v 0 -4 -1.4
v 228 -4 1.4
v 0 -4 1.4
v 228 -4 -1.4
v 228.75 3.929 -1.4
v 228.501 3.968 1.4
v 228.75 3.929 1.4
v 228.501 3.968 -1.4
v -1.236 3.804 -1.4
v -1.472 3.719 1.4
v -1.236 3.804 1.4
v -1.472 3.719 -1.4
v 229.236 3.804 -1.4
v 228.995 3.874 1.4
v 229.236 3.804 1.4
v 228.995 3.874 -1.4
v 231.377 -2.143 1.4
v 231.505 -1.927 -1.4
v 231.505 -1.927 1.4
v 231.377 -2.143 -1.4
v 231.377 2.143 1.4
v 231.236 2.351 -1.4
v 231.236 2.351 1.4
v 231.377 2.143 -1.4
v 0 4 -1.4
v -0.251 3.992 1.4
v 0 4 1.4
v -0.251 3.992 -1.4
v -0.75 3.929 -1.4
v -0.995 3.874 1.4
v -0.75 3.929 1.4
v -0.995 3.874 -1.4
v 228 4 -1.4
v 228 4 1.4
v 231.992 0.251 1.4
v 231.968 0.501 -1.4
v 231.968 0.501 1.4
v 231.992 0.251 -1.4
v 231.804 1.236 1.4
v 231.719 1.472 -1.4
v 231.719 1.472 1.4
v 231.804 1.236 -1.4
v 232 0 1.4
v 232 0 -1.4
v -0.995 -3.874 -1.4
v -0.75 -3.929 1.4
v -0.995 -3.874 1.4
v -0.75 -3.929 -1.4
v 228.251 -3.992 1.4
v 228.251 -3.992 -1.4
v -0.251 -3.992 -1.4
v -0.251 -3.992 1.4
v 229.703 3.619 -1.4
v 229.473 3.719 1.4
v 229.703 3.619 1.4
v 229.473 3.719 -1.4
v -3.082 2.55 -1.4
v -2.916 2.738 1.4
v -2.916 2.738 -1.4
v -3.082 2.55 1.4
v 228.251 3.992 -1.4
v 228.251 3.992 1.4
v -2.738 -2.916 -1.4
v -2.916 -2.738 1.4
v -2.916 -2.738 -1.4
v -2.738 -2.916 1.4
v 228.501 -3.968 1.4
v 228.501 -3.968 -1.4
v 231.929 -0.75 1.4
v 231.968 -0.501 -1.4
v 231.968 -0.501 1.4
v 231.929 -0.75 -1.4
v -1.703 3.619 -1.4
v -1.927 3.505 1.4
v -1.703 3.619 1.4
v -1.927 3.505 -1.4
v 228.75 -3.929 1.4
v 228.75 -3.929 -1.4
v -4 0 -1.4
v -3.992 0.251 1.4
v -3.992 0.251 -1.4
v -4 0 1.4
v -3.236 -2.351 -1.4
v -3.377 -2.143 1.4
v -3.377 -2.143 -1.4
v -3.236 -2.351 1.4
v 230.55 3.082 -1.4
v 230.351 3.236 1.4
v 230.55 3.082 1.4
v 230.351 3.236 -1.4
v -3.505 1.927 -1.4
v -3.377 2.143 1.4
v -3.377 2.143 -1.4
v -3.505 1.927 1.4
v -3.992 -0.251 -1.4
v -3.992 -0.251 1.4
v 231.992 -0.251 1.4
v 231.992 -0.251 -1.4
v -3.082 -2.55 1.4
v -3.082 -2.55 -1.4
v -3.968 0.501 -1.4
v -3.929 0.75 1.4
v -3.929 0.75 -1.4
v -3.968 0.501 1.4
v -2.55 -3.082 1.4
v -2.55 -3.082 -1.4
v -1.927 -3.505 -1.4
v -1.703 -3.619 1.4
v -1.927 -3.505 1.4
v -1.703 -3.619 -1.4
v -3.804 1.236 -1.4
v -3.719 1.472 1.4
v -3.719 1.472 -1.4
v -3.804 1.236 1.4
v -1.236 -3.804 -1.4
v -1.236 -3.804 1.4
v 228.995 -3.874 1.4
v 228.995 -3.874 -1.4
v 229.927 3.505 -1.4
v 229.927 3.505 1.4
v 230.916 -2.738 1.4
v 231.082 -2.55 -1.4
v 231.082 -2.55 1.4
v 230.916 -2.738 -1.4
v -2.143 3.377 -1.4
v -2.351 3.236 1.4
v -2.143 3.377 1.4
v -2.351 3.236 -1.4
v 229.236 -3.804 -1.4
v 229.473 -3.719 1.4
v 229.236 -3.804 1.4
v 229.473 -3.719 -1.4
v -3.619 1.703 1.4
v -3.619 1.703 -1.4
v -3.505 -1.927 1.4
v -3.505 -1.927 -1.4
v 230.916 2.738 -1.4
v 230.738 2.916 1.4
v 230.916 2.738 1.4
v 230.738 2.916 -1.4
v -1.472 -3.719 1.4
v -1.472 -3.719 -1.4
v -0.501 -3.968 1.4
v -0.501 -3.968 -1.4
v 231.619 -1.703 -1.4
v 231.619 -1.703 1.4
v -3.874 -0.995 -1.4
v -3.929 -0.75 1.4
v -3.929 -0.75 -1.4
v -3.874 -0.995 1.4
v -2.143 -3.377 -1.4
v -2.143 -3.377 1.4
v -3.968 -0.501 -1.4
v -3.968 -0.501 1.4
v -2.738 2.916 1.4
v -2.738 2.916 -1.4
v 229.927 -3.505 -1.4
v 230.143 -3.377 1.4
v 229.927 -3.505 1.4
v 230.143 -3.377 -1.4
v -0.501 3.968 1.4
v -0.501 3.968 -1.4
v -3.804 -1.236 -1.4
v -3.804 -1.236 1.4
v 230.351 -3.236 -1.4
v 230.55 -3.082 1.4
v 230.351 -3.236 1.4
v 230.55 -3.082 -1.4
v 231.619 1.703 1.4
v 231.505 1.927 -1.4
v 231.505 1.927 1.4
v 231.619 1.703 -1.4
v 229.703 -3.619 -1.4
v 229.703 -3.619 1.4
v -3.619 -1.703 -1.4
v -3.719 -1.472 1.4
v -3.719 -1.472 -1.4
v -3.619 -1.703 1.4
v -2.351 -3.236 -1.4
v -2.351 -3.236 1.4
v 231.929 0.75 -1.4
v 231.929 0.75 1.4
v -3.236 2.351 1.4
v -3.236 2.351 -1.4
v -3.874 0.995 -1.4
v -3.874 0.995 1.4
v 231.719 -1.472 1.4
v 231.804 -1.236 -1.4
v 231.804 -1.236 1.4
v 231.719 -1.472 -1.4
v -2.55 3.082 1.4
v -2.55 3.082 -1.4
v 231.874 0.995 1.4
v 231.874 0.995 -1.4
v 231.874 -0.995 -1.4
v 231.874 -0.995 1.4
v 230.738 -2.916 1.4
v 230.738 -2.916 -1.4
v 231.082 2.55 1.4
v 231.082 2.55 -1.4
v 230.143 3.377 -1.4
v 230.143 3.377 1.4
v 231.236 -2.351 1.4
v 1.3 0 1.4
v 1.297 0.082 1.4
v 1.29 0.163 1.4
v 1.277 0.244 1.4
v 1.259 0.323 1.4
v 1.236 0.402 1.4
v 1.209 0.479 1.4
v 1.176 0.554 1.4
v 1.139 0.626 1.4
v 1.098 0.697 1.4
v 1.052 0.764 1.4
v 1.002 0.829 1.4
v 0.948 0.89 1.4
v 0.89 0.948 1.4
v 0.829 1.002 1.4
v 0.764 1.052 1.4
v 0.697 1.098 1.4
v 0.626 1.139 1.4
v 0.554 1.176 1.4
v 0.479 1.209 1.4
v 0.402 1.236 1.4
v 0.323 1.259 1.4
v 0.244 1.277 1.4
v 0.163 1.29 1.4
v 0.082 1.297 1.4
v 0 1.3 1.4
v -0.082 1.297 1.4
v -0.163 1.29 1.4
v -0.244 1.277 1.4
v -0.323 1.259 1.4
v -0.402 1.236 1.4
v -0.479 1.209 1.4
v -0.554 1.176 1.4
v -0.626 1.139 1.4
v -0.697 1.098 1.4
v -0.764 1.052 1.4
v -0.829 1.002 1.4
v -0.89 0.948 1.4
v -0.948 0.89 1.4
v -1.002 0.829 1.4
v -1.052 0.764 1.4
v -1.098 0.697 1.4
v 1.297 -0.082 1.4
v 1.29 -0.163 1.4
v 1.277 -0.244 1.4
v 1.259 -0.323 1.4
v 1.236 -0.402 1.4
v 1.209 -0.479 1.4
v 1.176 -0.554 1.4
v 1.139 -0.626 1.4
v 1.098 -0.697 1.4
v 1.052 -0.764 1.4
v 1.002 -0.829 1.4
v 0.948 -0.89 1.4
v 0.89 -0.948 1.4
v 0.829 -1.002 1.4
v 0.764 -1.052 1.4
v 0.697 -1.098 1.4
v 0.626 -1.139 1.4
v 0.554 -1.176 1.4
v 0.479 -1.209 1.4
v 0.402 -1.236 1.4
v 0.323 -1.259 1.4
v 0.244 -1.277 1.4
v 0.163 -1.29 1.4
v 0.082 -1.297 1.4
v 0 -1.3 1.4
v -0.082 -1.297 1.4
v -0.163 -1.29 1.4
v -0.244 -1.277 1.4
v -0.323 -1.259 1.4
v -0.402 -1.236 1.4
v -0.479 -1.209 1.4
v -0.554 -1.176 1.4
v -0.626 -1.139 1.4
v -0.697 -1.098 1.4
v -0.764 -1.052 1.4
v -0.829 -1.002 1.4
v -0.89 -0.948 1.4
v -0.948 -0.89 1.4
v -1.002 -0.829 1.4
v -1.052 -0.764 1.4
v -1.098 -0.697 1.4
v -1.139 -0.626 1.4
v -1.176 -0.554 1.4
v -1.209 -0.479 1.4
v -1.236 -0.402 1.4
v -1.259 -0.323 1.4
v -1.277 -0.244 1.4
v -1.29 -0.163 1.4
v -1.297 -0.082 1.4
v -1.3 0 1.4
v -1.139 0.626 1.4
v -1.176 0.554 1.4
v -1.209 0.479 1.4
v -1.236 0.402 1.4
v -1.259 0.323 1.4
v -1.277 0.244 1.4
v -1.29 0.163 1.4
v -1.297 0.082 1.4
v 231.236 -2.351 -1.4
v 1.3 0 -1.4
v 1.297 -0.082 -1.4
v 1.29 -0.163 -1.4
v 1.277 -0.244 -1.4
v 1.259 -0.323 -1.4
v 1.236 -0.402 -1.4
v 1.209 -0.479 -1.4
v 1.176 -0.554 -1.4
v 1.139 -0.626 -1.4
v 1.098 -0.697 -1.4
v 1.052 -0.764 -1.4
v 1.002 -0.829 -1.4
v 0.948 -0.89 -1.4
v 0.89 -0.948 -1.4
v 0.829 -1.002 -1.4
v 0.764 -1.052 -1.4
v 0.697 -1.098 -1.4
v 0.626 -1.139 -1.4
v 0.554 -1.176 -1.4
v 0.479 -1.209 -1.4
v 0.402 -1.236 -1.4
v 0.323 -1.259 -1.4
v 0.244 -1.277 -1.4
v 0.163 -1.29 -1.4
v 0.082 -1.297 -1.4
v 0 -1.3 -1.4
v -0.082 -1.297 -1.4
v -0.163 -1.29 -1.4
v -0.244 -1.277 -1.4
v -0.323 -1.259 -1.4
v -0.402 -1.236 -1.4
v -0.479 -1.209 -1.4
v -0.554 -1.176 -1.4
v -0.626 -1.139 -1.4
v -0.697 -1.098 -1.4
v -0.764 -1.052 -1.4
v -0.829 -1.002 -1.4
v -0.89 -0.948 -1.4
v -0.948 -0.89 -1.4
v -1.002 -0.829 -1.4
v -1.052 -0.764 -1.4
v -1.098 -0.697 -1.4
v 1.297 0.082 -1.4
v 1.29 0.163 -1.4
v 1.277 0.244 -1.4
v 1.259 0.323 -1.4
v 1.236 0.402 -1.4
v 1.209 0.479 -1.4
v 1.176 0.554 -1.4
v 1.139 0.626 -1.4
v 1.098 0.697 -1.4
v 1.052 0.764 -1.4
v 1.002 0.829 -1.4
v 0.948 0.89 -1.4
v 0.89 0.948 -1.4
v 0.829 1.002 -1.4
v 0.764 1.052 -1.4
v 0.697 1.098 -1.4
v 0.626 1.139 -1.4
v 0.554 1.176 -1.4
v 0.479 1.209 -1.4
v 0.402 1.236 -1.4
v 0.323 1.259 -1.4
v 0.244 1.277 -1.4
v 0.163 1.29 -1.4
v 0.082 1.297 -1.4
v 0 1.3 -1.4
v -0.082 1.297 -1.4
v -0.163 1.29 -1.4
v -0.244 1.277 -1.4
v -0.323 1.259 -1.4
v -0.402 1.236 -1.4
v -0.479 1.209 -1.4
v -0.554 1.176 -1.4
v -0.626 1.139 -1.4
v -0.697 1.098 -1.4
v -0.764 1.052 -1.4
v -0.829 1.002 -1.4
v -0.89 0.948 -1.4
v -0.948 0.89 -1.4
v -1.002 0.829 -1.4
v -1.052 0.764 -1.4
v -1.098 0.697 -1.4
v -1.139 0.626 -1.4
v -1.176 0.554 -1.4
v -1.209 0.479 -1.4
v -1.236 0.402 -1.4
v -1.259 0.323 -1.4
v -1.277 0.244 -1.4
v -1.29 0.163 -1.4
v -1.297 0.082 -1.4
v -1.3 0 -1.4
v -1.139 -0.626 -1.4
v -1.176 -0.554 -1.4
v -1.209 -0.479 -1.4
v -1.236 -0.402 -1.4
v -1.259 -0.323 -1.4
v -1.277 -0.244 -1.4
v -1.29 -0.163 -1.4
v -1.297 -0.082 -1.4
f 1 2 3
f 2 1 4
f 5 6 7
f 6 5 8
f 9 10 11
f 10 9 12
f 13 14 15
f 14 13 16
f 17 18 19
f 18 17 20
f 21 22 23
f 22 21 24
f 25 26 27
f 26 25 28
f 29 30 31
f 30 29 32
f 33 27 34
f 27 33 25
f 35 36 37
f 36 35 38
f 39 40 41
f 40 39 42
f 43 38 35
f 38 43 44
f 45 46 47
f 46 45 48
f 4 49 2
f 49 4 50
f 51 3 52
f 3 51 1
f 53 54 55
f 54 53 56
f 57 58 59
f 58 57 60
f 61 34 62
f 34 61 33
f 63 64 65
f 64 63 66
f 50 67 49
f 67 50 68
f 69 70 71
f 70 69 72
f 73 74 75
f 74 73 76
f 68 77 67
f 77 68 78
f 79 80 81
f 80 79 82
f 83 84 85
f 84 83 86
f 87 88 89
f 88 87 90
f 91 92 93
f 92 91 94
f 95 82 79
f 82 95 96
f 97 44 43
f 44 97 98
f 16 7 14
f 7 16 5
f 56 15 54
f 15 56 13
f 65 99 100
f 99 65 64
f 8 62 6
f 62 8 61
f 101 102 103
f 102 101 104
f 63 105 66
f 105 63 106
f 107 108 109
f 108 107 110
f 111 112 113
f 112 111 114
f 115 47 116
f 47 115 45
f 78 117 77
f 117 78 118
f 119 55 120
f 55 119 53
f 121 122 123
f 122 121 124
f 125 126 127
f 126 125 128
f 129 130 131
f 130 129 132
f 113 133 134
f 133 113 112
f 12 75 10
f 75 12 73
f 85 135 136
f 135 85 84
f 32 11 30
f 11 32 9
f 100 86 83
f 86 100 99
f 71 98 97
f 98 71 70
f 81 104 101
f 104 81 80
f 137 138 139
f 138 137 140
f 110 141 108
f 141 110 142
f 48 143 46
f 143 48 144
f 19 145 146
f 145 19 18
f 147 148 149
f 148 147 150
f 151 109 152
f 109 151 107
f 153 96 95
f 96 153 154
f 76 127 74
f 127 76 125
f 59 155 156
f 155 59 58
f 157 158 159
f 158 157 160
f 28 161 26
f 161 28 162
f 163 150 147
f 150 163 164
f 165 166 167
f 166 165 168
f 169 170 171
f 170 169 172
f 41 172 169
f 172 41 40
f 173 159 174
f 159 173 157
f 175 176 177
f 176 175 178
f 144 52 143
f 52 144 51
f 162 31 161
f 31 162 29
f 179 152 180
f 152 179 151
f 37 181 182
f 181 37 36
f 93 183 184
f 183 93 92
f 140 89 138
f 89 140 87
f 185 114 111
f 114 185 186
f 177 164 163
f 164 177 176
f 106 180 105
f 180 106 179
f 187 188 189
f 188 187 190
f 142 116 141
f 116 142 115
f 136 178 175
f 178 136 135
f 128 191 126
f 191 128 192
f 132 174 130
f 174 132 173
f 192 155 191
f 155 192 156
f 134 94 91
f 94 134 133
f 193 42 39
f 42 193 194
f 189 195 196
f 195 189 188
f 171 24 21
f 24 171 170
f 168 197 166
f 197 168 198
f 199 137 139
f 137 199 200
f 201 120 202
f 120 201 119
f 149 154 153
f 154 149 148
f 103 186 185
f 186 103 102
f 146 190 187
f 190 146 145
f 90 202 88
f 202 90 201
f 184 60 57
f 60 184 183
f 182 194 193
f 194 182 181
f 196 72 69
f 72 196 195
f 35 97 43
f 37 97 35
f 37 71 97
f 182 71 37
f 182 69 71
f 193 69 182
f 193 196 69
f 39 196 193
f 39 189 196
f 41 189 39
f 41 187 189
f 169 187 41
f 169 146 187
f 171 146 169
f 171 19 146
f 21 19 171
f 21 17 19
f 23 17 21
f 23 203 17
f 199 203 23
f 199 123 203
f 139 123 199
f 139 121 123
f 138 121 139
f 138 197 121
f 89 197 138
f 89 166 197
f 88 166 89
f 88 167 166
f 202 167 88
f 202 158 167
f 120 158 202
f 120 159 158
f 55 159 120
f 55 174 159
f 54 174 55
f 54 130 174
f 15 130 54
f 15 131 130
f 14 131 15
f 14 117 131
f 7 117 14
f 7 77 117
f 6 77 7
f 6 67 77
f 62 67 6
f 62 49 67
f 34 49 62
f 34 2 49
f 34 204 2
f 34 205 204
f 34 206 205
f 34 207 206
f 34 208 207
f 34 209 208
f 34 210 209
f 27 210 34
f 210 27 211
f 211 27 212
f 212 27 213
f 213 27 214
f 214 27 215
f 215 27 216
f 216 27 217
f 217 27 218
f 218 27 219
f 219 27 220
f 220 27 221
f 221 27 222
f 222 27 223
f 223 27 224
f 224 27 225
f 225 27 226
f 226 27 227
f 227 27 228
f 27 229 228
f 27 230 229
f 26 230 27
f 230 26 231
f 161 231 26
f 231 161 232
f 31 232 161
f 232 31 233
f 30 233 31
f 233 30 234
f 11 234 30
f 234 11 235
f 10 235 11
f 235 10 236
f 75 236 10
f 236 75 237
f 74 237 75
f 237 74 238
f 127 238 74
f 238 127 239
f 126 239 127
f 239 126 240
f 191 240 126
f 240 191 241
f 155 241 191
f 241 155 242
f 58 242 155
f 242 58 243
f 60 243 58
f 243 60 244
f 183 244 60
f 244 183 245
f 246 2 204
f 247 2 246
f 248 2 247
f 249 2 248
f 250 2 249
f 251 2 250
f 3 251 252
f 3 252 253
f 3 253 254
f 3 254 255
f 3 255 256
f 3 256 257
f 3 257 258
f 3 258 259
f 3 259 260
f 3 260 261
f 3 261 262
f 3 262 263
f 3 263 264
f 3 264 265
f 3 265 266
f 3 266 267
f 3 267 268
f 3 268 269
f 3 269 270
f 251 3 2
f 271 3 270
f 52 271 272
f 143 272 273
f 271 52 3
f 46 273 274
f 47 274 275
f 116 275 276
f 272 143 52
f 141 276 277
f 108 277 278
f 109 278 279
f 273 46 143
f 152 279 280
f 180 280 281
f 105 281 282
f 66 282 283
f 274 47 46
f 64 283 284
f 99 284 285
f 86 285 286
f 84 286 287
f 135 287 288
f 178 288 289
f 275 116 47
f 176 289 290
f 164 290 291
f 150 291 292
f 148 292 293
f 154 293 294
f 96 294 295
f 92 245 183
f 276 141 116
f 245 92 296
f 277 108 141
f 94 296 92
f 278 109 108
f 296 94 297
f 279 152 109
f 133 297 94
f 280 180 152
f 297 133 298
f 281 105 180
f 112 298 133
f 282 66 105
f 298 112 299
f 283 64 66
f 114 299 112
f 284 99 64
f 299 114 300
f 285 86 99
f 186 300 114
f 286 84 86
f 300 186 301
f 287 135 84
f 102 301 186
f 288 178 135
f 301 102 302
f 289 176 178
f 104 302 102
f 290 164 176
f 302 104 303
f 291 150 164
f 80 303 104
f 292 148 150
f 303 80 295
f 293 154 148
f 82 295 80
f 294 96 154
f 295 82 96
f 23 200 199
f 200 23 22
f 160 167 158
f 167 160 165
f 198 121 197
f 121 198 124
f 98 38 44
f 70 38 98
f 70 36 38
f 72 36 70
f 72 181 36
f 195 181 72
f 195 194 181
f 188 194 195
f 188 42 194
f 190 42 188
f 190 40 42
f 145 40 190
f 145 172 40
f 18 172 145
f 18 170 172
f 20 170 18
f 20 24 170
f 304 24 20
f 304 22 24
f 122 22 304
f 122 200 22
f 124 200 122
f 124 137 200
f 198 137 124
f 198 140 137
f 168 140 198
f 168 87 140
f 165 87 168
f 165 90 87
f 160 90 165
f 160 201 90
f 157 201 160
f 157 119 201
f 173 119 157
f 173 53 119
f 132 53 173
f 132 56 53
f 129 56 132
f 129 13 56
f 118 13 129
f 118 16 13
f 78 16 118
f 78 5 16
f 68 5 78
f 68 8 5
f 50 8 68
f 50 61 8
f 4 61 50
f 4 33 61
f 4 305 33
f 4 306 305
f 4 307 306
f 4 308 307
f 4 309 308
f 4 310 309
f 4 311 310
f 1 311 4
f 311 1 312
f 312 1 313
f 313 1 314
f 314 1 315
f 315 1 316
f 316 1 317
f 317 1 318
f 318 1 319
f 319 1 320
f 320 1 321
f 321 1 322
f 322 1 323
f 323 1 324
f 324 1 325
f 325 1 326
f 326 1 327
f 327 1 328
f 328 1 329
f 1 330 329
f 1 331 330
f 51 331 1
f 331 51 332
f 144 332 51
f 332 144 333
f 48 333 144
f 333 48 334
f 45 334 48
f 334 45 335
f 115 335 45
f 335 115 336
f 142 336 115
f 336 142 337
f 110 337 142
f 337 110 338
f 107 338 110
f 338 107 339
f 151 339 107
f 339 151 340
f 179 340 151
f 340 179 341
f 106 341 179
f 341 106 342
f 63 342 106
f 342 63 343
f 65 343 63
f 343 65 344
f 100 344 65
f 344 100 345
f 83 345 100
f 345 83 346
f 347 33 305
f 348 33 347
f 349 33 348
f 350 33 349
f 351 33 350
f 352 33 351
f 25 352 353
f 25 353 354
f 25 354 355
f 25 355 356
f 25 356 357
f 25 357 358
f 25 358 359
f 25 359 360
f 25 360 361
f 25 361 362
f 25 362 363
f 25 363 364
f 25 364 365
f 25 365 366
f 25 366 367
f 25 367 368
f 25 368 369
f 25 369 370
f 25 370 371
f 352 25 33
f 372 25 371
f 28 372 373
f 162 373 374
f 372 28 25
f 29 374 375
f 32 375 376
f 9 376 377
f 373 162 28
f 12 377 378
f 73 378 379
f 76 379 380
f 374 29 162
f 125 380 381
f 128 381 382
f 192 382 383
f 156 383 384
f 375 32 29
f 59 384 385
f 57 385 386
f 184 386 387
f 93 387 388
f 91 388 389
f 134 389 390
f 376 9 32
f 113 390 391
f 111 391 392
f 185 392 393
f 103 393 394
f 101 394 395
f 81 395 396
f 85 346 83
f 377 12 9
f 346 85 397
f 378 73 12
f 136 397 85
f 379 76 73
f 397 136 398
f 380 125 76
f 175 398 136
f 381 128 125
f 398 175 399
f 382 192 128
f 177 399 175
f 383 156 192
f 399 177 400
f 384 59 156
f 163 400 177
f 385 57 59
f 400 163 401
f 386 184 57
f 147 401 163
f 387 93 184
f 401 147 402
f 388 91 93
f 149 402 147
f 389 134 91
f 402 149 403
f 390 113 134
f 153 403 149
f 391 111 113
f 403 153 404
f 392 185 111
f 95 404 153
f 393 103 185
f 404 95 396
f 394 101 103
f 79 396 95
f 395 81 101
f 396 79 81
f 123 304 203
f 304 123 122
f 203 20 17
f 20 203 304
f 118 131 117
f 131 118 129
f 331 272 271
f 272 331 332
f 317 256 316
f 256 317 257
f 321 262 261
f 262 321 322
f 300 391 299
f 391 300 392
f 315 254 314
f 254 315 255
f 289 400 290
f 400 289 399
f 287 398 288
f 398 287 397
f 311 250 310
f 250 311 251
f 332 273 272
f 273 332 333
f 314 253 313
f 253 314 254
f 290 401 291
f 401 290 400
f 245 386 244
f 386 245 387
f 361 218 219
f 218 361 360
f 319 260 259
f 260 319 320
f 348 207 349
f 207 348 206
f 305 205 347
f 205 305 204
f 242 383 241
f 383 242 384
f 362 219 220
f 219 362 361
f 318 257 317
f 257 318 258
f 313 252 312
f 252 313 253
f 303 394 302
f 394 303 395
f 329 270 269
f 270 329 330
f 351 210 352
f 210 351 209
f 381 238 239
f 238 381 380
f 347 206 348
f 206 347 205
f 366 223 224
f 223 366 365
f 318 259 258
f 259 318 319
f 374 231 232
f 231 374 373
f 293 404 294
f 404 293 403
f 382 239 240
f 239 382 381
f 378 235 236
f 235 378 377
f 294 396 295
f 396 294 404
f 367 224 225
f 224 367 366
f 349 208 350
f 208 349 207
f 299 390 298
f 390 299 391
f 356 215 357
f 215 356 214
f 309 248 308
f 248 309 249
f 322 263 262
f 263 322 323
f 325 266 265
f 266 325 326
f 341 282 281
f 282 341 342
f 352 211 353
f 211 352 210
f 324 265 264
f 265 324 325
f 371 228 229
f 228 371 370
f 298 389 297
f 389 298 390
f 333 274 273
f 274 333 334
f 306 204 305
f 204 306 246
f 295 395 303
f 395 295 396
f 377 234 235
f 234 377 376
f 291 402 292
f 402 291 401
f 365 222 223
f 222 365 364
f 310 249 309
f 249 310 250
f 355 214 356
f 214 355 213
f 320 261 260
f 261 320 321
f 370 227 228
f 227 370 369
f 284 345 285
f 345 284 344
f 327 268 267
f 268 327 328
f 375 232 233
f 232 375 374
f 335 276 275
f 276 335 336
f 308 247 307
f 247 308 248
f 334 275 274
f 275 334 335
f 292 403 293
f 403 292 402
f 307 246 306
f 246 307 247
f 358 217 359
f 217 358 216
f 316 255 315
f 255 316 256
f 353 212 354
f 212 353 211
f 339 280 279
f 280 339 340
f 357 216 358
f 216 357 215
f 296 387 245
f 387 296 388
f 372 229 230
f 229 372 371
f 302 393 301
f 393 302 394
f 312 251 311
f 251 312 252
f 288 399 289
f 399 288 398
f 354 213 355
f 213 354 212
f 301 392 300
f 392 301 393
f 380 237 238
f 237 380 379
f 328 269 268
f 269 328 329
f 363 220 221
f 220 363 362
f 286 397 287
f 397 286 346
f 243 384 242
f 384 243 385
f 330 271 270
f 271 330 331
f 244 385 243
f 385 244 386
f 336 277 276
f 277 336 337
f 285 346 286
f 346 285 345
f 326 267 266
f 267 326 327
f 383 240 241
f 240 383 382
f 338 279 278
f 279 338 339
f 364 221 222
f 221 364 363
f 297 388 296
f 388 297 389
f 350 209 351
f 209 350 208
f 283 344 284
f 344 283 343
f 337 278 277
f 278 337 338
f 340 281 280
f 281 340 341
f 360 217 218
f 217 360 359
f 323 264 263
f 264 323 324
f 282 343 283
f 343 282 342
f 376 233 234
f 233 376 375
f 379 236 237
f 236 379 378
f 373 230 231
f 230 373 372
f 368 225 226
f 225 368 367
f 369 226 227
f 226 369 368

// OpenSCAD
innerDiameter = 1.3;
outerDiameter = 4;
width = 2.8;
resolution = 100;
length = 228;

difference(){
    
    hull(){
        linear_extrude(height = width, center = true, convexity = 10, twist = 0, $fn = resolution){
            circle(outerDiameter, $fn = resolution);
        }
        

        linear_extrude(height = width, center = true, convexity = 10, twist = 0, $fn = resolution){
            translate([length,0,0])
                circle(outerDiameter, $fn = resolution);
        }
    }
    linear_extrude(height = width, center = true, convexity = 10, twist = 0, $fn = resolution){
        circle(innerDiameter, $fn = resolution);
    }
    

}
